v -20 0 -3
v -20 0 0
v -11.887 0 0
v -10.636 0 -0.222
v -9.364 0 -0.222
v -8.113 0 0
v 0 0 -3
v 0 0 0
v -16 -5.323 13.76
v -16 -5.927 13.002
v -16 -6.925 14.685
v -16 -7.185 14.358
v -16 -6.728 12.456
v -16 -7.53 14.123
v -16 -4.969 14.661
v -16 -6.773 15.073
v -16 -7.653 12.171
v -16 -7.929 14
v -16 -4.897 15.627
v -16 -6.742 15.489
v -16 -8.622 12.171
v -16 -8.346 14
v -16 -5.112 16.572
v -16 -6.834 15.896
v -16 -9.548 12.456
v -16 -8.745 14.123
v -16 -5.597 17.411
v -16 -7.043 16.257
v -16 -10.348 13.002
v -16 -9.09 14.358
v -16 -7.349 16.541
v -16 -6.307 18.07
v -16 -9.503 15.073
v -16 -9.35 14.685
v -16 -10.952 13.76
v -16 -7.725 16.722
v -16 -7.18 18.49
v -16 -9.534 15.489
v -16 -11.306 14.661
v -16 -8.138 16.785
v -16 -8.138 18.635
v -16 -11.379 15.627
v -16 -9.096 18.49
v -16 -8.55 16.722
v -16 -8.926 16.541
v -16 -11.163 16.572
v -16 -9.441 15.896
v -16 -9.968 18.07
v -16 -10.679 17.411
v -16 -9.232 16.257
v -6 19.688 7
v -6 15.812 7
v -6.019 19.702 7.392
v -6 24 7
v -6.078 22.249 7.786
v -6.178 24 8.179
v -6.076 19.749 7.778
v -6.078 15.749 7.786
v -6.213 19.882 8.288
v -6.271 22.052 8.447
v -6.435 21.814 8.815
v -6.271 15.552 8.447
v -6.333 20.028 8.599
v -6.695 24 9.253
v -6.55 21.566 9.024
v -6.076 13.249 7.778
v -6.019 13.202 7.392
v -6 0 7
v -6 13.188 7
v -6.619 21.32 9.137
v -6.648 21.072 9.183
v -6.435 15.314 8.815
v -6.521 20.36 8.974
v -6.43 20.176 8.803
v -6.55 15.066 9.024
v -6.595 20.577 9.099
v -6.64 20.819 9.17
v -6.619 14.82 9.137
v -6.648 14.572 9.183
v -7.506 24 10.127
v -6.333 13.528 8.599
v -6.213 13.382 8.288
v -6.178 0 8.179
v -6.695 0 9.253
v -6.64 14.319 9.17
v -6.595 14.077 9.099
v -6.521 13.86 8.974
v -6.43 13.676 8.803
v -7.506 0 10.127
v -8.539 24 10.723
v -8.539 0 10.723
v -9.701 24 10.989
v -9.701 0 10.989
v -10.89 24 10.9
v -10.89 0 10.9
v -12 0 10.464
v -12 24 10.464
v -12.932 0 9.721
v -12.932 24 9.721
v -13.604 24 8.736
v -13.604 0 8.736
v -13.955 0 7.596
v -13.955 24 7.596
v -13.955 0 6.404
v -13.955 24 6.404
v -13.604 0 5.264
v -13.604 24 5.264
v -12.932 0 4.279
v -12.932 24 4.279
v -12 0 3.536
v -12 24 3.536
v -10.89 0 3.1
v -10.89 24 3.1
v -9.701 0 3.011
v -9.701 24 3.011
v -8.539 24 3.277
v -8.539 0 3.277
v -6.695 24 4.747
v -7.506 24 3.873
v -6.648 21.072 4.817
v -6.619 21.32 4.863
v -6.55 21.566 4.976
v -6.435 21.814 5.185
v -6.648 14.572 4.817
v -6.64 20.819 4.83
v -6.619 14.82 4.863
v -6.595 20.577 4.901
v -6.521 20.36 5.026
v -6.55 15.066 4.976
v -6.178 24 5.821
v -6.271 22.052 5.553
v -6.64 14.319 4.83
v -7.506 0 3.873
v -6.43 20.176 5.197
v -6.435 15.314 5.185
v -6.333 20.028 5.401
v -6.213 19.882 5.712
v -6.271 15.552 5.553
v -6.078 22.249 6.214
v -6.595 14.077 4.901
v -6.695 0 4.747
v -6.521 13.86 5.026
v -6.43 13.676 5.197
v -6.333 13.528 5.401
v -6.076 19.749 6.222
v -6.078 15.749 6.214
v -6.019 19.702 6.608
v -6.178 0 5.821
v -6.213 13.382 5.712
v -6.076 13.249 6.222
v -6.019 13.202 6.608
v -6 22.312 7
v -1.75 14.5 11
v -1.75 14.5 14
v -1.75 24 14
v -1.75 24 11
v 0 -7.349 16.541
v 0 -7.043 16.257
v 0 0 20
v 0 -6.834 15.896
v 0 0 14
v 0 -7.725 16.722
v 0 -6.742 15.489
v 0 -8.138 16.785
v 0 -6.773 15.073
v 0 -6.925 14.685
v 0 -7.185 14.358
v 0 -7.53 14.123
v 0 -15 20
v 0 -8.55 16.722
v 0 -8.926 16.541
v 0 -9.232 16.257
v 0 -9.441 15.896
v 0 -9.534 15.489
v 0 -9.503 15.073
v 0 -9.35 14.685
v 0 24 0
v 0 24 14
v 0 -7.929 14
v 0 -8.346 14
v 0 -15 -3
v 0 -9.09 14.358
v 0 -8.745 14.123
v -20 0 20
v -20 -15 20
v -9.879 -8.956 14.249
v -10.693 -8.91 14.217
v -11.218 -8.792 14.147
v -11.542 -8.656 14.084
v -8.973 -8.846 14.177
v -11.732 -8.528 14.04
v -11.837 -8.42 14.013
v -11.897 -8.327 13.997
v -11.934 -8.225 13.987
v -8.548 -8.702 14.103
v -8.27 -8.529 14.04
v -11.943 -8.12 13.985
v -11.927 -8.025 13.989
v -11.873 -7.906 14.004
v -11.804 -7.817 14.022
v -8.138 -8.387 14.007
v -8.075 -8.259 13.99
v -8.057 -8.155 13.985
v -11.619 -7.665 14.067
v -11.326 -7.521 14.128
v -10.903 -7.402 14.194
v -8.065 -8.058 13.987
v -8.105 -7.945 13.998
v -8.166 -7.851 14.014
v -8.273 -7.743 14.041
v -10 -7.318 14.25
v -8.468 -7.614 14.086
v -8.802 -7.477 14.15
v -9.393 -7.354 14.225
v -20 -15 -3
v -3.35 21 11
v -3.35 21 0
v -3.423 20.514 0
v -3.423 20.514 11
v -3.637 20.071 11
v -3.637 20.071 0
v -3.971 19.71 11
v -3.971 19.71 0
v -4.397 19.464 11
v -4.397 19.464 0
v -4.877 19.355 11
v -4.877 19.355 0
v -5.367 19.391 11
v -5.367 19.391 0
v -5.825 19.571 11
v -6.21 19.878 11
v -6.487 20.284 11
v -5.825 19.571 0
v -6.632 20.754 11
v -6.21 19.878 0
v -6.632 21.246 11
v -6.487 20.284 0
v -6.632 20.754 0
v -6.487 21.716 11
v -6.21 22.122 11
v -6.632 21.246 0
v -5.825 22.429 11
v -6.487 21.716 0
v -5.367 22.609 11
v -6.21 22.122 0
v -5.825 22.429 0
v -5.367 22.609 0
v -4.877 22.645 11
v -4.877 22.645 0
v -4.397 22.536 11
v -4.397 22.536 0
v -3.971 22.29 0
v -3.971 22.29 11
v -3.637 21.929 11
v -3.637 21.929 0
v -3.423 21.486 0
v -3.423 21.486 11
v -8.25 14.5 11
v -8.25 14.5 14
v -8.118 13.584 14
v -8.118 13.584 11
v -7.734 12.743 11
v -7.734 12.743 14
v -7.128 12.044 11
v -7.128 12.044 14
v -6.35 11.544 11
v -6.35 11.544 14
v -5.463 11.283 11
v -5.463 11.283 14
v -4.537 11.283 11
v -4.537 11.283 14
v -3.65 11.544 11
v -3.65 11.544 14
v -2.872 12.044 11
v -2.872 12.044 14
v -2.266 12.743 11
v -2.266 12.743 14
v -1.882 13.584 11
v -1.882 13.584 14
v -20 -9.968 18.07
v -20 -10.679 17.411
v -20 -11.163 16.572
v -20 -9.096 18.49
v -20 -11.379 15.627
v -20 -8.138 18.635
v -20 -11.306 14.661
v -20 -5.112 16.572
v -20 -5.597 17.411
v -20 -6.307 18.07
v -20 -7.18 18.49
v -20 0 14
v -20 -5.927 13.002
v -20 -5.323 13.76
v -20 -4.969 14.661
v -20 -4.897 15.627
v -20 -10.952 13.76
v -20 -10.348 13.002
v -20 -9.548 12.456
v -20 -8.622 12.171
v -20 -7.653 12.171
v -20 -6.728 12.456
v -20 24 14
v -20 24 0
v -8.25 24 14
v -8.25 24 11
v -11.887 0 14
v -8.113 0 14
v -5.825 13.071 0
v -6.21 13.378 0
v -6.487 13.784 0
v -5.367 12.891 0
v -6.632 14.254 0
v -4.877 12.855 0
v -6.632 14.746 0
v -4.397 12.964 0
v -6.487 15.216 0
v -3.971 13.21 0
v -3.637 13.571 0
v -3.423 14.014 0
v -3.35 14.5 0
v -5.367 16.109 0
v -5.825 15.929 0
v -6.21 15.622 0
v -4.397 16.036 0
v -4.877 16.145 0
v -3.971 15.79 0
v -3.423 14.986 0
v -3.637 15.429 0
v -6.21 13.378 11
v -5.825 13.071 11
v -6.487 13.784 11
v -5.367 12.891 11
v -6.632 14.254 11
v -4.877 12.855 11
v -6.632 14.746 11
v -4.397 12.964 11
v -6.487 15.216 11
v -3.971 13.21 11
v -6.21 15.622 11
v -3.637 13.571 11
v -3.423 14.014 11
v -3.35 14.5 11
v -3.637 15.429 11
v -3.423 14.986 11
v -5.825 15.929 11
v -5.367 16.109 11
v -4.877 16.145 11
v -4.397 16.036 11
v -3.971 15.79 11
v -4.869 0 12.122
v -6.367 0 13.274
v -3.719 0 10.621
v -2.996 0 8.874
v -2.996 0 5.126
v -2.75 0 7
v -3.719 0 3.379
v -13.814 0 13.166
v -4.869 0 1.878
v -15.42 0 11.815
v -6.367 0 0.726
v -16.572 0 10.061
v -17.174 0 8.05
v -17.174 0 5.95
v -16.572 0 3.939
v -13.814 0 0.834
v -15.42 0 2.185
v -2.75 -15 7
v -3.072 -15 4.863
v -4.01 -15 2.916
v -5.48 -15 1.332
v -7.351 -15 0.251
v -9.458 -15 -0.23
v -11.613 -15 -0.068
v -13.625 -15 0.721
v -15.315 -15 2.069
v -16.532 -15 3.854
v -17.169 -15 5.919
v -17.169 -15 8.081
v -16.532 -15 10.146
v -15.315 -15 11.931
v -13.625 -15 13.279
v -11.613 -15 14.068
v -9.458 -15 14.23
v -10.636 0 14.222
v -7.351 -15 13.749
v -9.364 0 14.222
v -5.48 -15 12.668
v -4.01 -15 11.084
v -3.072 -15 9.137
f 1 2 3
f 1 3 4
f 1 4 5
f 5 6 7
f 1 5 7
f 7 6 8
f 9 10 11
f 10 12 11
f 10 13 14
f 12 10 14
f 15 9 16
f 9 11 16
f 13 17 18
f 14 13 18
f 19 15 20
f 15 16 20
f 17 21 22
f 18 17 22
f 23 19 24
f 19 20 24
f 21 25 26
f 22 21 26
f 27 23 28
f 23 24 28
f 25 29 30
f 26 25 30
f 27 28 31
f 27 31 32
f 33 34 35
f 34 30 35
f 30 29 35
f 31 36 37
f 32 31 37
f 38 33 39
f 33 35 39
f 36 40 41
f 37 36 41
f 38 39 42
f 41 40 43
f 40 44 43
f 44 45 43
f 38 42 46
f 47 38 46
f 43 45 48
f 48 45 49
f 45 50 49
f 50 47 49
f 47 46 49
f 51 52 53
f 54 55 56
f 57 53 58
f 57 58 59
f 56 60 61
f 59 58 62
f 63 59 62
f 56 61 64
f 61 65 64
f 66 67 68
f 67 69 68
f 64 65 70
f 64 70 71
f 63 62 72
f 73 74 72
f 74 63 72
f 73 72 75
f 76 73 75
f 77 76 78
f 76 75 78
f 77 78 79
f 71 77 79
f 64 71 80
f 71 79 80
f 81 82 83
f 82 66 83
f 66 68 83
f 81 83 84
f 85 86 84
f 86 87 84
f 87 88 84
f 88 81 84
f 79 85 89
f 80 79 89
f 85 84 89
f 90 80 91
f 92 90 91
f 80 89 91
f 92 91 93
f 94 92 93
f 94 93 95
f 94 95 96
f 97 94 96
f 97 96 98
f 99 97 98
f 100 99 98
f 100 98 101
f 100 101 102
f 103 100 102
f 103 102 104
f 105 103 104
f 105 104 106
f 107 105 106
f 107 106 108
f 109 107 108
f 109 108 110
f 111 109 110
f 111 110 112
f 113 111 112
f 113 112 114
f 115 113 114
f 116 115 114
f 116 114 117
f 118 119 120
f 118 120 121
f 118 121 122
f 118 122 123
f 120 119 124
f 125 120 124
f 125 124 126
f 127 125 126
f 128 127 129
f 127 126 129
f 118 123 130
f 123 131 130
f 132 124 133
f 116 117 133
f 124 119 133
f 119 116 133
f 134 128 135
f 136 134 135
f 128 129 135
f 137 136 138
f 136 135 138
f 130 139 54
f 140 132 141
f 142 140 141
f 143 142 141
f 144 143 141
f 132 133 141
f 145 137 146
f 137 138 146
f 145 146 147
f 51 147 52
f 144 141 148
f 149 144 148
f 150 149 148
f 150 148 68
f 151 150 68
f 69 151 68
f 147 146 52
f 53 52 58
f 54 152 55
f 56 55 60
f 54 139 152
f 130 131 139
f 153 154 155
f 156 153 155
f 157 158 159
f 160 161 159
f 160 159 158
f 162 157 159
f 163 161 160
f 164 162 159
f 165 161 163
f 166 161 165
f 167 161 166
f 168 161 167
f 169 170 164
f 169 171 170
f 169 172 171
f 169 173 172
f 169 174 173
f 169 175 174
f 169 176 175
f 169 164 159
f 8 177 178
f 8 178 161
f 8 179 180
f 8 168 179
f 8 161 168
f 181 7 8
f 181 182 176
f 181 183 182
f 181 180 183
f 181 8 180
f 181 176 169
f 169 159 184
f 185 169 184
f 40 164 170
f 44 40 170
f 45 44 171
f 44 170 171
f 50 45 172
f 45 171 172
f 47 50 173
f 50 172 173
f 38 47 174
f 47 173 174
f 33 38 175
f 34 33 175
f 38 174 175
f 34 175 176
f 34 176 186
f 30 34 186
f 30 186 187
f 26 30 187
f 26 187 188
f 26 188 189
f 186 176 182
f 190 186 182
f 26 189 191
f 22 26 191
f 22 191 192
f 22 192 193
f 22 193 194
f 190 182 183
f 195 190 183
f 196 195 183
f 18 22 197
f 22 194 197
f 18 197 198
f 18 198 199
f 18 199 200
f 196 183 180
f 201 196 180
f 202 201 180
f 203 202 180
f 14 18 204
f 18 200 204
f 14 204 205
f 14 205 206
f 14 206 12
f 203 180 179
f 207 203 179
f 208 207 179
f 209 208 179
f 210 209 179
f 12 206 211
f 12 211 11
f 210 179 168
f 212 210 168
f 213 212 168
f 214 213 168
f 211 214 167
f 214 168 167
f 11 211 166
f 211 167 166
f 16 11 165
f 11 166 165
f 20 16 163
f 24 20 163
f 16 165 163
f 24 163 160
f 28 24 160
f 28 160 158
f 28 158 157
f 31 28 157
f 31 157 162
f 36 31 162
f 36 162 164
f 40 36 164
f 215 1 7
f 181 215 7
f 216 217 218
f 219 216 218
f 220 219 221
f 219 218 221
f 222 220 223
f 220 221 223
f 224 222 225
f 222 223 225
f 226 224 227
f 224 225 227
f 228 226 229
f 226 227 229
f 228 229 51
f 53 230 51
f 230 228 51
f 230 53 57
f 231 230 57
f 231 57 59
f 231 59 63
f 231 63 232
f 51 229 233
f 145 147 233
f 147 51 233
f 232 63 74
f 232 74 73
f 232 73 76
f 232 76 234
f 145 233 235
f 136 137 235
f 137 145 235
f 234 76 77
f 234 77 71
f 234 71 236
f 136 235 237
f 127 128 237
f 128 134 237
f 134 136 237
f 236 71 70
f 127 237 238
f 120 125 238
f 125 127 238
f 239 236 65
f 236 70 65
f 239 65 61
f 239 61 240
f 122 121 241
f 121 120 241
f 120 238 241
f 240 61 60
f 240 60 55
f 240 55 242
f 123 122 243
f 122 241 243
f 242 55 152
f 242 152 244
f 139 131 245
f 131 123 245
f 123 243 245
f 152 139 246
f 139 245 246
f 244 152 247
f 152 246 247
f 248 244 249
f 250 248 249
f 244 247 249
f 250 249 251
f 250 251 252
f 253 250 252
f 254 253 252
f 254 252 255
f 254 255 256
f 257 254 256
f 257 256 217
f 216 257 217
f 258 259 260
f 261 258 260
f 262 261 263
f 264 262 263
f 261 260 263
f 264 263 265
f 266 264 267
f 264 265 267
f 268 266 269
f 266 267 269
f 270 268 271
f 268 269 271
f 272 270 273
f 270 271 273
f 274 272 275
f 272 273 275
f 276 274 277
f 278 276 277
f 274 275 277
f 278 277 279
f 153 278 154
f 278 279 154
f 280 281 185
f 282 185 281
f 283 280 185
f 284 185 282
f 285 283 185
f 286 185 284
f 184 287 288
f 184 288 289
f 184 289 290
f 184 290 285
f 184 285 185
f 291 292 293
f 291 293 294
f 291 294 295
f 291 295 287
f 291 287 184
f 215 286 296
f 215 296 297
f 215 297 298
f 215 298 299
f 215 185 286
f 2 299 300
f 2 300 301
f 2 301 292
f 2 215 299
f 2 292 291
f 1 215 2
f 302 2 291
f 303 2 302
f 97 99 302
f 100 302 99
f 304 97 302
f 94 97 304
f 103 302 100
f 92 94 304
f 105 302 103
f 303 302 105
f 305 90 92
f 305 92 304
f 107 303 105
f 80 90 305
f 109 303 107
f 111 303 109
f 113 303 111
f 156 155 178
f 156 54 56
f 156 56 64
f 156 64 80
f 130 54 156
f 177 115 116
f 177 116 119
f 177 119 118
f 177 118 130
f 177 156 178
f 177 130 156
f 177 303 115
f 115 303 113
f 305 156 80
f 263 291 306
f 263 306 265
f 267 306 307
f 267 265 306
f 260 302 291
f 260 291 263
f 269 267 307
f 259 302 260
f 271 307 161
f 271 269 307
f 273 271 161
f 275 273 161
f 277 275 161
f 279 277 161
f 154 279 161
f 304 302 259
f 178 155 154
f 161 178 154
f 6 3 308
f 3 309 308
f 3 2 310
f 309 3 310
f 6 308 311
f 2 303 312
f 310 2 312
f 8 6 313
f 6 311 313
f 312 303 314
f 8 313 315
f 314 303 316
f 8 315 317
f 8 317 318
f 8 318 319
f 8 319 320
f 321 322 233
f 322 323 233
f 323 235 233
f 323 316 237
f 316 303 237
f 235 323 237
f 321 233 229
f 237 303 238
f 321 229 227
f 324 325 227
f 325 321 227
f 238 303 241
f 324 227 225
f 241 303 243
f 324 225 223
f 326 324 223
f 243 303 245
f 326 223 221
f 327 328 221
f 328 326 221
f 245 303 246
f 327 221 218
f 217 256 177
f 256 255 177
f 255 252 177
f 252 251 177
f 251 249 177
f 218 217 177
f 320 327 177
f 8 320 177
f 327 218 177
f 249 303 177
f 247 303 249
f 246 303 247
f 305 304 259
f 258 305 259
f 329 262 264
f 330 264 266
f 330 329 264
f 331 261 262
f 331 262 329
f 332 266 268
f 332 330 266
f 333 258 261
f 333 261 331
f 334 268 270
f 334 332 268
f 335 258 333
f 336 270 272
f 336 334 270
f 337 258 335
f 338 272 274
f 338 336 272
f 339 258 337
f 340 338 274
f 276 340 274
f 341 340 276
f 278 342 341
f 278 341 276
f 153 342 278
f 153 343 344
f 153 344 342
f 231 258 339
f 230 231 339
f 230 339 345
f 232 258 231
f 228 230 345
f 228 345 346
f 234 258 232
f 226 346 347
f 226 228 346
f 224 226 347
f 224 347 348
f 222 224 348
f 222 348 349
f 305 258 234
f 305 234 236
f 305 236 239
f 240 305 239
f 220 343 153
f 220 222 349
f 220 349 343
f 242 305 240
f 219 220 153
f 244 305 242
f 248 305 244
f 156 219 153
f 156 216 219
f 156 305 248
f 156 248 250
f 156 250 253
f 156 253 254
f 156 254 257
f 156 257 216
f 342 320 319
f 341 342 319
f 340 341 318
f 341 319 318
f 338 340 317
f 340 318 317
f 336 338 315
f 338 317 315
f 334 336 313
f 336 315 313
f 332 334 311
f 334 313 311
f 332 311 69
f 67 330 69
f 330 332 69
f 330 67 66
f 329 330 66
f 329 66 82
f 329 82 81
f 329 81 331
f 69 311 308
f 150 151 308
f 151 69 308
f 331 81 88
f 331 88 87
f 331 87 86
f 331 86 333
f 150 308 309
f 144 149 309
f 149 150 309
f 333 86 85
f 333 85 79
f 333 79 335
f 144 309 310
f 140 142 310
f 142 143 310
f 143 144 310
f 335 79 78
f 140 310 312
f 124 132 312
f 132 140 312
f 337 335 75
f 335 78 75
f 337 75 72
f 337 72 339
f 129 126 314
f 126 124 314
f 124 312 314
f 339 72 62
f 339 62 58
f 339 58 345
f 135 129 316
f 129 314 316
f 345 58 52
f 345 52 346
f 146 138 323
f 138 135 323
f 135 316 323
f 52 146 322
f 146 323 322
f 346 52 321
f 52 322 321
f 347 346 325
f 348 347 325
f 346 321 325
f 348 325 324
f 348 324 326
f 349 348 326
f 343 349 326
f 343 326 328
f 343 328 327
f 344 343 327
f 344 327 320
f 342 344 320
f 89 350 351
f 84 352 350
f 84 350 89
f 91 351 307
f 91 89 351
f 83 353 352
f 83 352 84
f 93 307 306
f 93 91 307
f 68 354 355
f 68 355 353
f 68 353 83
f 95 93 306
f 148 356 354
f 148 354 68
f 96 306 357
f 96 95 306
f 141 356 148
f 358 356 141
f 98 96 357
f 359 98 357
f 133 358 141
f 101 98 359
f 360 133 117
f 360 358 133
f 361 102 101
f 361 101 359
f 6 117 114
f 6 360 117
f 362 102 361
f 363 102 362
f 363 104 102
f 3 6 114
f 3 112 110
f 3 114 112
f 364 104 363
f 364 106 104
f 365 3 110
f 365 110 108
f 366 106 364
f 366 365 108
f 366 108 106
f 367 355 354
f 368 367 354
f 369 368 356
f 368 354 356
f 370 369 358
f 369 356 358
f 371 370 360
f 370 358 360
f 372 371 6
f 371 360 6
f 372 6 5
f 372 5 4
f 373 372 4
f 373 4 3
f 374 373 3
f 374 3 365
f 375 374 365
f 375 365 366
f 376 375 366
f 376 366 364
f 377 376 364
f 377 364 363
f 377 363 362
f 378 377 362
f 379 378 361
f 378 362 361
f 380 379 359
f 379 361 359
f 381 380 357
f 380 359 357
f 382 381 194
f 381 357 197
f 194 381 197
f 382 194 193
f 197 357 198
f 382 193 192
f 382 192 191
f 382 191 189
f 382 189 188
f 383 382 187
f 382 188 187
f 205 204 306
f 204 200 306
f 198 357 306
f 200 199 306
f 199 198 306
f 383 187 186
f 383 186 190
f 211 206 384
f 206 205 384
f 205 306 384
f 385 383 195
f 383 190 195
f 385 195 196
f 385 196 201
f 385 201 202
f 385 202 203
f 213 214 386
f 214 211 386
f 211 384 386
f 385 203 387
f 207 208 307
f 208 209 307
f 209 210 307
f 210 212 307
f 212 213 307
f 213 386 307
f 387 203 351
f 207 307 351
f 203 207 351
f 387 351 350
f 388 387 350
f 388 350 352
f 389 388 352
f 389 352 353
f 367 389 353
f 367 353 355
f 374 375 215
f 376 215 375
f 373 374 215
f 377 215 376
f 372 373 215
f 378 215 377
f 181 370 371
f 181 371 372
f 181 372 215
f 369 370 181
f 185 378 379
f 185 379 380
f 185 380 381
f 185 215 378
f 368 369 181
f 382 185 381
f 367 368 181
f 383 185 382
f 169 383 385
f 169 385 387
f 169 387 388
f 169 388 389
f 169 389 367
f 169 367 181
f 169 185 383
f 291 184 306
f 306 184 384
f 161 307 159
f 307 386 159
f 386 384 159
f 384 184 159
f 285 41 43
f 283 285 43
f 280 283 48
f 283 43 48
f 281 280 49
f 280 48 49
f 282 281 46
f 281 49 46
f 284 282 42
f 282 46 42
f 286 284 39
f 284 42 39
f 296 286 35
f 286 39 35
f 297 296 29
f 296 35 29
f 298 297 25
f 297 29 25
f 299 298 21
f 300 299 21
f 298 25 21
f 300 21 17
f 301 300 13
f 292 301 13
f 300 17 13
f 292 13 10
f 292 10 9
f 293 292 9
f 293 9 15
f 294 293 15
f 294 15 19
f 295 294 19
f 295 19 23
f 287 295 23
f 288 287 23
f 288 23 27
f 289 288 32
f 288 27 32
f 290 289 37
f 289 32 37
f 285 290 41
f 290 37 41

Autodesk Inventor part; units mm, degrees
ref_plane "YZ Plane" through (0, 0, 0) normal (1, 0, 0) x (0, 1, 0)
ref_plane "XZ Plane" through (0, 0, 0) normal (0, 1, 0) x (-1, 0, 0)
ref_plane "XY Plane" through (0, 0, 0) normal (0, 0, 1) x (1, 0, 0)
sketch "Skizze6" plane through (0, 0, 0) normal (0, 0, 1) x (1, 0, 0)
  line L0 (0, 0) -> (-20, 0)
  line L1 (-20, 0) -> (-20, 24)
  line L2 (-20, 24) -> (0, 24)
  line L3 (0, 24) -> (0, 0)
  circle A0 centre (-5, 21) radius 1.65
  circle A1 centre (-5, 14.5) radius 1.65
  dimension "d29" = 20
  dimension "d30" = 24
  dimension "d31" = 3.3
  dimension "d32" = 3.3
  dimension "d33" = 3
  dimension "d34" = 6.5
  dimension "d35" = 5
extrude "Extrusion5" add sketch "Skizze6" along normal blind 14
sketch "Skizze7" plane through (-20, 0, 0) normal (0, -1, 0) x (1, 0, 0)
  line L0 (0, 0) -> (20, 0) projected
  line L1 (20, 0) -> (20, 14) projected
  line L2 (0, 14) -> (20, 14) projected
  line L3 (0, 0) -> (0, 14) projected
  circle A0 centre (10, 7) radius 4
  dimension "d38" = 8
  dimension "d39" = 10
extrude "Extrusion6" cut sketch "Skizze7" against normal through all contours A0
sketch "Skizze8" plane through (0, 0, 14) normal (0, 0, 1) x (1, 0, 0)
  line L0 (0, 24) -> (-20, 24) projected
  line L1 (-20, 24) -> (-20, 0) projected
  line L2 (-20, 0) -> (0, 0) projected
  line L3 (0, 0) -> (0, 24) projected
  circle A0 centre (-5, 14.5) radius 1.65 projected
  circle A1 centre (-5, 21) radius 1.65 projected
  line L4 (-5, 14.5) -> (-5, 31.6413) construction
  line L5 (-1.75, 14.5) -> (-1.75, 31.6413)
  line L6 (-8.25, 31.6413) -> (-8.25, 14.5)
  arc A2 (-8.25, 14.5) -> (-1.75, 14.5) centre (-5, 14.5) ccw
  arc A3 (-1.75, 31.6413) -> (-8.25, 31.6413) centre (-5, 31.6413) ccw
  point P0 (-5, 23.0707)
  dimension "d42" = 6.5
extrude "Extrusion7" cut sketch "Skizze8" against normal blind 3 contours L5 A2 L6 L0 | L0 L6 A3 L5 | A0 | A1
sketch "Skizze9" plane through (-20, 0, 0) normal (0, -1, 0) x (1, 0, 0)
  circle A0 centre (10, 7) radius 4 projected
  line L0 (0, 0) -> (20, 0) projected
  line L1 (20, 0) -> (20, 14) projected
  line L2 (0, 14) -> (20, 14) projected
  line L3 (0, 0) -> (0, 14) projected
  circle A1 centre (10, 7) radius 7.25
  line L4 (20, 17) -> (0, 17)
  line L5 (0, 17) -> (0, -3)
  line L6 (0, -3) -> (20, -3)
  line L7 (20, -3) -> (20, 17)
  line L8 (20, 17) -> (0, -3) construction
  line L9 (0, 17) -> (20, -3) construction
  line L10 (0, 17) -> (20, 17)
  line L11 (20, 17) -> (20, 20)
  line L12 (20, 20) -> (0, 20)
  line L13 (0, 20) -> (0, 17)
  dimension "d45" = 14.5
  dimension "d46" = 20
  dimension "d47" = 20
  dimension "d50" = 3
extrude "Extrusion8" add sketch "Skizze9" along normal blind 15 contours L3 L2 A1 L0 | L0 A1 L7 L6 L5 | L5 L4 L7 L2 A1 | A1 L2 L1 L0 | L13 L12 L11 L4
sketch "Skizze10" plane through (-20, 24, 0) normal (-1, 0, 0) x (0, 0, 1)
  line L0 (14.25, -39) -> (14.25, -24) projected
  circle A0 centre (15.3846, -32.1377) radius 1.4
  point P0 (0, -24)
  dimension "d51" = 2.8
hole "Bohrung2" at (-20, -8.1377, 15.3846) direction (1, 0, 0) diameter 2.8 end through all counterbore diameter 6.5 counterbore depth 4
properties part number "40_XYZstage_micrometer_motorized_nema8_nanotec_adapter_z"
